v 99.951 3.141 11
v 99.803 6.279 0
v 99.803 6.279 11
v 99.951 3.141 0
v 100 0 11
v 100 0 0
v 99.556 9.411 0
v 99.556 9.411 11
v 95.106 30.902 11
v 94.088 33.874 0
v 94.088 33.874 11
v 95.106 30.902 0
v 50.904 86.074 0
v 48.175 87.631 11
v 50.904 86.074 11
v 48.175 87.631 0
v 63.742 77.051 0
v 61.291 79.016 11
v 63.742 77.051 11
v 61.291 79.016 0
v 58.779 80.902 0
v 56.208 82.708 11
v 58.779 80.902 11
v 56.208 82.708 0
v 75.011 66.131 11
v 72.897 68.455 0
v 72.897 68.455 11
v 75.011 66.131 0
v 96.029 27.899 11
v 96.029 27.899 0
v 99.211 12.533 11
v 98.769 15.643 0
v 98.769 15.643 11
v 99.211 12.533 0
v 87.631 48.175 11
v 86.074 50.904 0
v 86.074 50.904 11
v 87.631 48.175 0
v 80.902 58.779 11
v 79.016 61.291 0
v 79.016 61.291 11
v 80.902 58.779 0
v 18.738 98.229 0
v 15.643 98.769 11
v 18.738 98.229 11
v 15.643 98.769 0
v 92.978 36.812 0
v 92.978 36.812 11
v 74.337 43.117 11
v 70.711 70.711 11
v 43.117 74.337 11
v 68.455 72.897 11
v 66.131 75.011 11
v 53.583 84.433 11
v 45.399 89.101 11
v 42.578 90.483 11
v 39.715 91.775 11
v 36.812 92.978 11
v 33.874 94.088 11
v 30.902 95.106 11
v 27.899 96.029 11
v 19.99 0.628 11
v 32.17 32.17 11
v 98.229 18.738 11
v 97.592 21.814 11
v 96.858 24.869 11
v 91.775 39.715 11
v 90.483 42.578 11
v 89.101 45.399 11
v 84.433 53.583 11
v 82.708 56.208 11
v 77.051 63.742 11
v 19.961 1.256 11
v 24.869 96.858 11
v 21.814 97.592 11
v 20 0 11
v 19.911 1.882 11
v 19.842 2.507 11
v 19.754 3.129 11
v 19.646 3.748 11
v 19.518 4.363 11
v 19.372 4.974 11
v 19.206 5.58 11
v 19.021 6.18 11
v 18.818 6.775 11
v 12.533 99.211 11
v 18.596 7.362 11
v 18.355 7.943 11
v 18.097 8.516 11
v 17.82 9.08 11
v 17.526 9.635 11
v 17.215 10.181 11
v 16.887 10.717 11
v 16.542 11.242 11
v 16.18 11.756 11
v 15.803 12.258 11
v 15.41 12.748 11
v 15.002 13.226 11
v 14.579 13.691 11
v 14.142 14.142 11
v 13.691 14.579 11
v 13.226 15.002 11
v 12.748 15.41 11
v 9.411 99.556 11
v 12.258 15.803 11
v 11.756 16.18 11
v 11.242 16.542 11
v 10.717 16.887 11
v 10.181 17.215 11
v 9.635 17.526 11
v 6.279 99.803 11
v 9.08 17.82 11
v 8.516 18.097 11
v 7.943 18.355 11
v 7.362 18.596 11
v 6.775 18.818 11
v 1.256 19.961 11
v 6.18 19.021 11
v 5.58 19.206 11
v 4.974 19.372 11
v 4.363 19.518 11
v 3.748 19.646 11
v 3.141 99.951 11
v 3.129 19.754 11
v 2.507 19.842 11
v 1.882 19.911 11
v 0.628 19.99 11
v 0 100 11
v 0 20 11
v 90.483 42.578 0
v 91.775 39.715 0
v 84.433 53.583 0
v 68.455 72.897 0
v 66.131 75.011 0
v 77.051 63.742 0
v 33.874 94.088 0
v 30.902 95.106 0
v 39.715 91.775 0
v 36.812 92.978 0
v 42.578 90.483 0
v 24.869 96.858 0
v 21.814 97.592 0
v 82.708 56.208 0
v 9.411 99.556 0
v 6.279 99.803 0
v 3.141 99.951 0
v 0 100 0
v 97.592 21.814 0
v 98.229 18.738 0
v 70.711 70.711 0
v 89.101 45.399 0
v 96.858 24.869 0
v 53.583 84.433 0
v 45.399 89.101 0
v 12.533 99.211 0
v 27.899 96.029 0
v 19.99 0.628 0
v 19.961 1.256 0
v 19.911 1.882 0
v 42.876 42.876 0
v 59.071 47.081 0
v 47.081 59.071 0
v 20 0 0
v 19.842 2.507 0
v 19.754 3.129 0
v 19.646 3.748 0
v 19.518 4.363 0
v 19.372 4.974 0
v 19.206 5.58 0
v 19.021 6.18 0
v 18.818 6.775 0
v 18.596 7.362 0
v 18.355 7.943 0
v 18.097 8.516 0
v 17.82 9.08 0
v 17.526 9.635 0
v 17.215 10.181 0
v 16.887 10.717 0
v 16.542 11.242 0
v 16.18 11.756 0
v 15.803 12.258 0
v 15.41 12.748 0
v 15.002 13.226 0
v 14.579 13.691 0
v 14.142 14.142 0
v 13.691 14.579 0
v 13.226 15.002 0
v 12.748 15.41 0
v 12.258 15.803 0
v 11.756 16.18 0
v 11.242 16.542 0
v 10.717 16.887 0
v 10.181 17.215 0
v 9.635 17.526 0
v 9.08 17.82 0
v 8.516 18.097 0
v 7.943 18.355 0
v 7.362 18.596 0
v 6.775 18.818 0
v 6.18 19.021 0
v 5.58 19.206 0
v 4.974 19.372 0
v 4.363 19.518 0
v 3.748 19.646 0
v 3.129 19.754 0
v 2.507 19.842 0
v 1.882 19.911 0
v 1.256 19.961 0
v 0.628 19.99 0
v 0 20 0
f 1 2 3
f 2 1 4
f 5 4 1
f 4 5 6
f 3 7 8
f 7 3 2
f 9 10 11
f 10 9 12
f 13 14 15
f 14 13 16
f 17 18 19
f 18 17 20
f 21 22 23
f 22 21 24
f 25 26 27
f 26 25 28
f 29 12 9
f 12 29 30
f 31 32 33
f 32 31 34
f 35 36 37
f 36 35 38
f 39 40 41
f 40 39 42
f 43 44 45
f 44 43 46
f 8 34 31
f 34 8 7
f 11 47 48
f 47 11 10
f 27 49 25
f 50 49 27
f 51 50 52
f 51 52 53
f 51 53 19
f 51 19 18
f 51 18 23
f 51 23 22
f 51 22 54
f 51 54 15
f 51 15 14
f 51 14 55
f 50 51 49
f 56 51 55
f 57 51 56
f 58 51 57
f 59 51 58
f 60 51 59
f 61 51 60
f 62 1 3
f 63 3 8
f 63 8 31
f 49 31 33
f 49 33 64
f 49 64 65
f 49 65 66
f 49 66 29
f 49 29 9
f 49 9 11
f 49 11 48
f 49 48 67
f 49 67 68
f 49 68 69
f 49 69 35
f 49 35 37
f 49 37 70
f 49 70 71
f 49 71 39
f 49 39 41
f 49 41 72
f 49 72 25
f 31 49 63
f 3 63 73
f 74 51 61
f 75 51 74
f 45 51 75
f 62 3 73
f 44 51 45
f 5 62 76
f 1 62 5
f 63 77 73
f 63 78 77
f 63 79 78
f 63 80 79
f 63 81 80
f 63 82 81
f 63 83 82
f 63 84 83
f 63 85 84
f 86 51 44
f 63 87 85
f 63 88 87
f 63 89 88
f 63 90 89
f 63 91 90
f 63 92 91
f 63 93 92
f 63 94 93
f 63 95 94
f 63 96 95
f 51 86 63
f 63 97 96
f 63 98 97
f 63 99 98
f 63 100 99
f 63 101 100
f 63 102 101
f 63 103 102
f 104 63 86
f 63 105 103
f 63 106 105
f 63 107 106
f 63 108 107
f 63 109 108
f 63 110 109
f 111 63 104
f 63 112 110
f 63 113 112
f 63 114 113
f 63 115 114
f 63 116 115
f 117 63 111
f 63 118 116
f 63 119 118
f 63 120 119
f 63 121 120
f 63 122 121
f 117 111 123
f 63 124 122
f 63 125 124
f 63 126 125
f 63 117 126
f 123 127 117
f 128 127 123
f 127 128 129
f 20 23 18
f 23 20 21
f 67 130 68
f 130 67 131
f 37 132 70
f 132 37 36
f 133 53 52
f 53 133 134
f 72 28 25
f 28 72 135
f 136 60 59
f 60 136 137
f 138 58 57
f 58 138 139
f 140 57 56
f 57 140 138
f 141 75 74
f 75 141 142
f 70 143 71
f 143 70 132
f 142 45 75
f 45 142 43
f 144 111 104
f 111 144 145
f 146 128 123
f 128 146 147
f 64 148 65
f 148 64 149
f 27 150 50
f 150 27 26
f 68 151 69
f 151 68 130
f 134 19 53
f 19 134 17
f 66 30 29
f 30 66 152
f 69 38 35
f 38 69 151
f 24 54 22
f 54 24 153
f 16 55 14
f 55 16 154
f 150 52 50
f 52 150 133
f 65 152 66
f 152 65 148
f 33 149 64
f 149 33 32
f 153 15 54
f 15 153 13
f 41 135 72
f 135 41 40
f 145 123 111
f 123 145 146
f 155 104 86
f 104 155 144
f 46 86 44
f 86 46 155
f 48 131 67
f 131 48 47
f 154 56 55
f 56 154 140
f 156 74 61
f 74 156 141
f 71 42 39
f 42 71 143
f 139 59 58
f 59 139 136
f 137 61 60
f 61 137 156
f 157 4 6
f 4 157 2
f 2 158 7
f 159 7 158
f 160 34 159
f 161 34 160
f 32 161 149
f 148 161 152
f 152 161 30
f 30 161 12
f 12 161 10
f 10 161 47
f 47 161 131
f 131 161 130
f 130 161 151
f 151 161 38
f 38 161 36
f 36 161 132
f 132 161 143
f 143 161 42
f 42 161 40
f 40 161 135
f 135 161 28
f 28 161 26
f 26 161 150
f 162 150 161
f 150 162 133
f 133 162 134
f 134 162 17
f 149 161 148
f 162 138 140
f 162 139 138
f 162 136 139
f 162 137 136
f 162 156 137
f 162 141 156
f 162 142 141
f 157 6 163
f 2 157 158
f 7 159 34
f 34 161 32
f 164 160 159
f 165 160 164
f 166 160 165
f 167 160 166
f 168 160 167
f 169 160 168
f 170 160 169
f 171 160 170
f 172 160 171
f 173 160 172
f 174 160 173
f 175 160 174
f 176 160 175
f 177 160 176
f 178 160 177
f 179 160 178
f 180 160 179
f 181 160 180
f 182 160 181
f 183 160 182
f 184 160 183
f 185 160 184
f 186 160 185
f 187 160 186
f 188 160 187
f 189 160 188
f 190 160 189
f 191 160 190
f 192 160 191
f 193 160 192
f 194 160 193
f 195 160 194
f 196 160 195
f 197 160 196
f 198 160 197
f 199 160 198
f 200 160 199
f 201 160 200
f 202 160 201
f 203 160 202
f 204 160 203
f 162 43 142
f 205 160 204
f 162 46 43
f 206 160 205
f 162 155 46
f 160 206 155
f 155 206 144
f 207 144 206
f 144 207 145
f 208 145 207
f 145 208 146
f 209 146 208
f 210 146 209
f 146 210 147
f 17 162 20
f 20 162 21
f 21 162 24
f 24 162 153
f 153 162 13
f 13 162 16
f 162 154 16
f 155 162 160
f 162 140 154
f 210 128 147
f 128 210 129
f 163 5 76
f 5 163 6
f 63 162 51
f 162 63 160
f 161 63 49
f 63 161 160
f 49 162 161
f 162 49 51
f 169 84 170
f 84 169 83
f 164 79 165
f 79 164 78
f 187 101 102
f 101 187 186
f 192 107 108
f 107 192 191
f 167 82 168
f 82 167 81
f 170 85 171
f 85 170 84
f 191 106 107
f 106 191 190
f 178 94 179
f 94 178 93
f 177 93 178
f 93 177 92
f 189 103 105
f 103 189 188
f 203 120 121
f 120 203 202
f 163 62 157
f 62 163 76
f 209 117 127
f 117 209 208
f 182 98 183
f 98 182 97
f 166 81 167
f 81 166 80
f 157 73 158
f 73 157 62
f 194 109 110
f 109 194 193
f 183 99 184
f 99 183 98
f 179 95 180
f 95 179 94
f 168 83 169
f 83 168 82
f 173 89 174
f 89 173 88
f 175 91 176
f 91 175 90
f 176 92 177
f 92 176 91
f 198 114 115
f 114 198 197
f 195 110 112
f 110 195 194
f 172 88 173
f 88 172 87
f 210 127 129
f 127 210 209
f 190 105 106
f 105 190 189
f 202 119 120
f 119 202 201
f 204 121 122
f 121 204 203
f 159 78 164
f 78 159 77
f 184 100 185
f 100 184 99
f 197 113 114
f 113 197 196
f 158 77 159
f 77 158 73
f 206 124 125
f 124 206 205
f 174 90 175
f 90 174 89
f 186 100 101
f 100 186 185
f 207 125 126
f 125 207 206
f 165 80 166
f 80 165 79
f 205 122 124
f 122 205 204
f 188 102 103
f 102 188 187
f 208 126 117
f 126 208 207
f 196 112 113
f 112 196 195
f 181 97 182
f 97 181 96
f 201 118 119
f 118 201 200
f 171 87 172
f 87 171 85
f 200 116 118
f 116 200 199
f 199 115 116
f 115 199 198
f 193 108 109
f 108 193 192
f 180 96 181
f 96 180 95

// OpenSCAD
//How big? (mm)
radius = 100;

//How tall? (mm)
height = 11;

//If you would like a cutout in the corner in case of a moulding, set to not zero
cornercut_radius = 20; //[0:5:40]

//What is the size of your cube? 57 is standard(mm)
cube_size = 57;

//How deep should your cube rest? Recommended is a little more than a third your cube size. (mm)
depth = 20;//[1:30]

//Would you like to preview how your cube will sit?
preview_cube = "false"; // [true:yes, false:no]


//option to preview the cube's location
if (preview_cube == "true"){
    translate([radius/2,radius/2,cube_size - depth +1])
        rotate([45,36,45]) 
        cube(cube_size, center=true);
}

    
difference(){
    
    //main body
    $fn = 200;
    cylinder(h=height, r=radius );
    
    //cut the cylinder into a quarter cylinder
    translate([-radius,0,0]) cube(2*radius, center=true);
    translate([0,-radius,0]) cube(2*radius, center=true);
    
    //cutout for the cube
    translate([radius/2,radius/2,cube_size - depth + (height/2)])
        rotate([45,36,45]) 
        cube(cube_size, center=true);
    
    //cutout for a moulding
    translate([0,0,-1]) cylinder(h=height +2 , r=cornercut_radius);
    
}
